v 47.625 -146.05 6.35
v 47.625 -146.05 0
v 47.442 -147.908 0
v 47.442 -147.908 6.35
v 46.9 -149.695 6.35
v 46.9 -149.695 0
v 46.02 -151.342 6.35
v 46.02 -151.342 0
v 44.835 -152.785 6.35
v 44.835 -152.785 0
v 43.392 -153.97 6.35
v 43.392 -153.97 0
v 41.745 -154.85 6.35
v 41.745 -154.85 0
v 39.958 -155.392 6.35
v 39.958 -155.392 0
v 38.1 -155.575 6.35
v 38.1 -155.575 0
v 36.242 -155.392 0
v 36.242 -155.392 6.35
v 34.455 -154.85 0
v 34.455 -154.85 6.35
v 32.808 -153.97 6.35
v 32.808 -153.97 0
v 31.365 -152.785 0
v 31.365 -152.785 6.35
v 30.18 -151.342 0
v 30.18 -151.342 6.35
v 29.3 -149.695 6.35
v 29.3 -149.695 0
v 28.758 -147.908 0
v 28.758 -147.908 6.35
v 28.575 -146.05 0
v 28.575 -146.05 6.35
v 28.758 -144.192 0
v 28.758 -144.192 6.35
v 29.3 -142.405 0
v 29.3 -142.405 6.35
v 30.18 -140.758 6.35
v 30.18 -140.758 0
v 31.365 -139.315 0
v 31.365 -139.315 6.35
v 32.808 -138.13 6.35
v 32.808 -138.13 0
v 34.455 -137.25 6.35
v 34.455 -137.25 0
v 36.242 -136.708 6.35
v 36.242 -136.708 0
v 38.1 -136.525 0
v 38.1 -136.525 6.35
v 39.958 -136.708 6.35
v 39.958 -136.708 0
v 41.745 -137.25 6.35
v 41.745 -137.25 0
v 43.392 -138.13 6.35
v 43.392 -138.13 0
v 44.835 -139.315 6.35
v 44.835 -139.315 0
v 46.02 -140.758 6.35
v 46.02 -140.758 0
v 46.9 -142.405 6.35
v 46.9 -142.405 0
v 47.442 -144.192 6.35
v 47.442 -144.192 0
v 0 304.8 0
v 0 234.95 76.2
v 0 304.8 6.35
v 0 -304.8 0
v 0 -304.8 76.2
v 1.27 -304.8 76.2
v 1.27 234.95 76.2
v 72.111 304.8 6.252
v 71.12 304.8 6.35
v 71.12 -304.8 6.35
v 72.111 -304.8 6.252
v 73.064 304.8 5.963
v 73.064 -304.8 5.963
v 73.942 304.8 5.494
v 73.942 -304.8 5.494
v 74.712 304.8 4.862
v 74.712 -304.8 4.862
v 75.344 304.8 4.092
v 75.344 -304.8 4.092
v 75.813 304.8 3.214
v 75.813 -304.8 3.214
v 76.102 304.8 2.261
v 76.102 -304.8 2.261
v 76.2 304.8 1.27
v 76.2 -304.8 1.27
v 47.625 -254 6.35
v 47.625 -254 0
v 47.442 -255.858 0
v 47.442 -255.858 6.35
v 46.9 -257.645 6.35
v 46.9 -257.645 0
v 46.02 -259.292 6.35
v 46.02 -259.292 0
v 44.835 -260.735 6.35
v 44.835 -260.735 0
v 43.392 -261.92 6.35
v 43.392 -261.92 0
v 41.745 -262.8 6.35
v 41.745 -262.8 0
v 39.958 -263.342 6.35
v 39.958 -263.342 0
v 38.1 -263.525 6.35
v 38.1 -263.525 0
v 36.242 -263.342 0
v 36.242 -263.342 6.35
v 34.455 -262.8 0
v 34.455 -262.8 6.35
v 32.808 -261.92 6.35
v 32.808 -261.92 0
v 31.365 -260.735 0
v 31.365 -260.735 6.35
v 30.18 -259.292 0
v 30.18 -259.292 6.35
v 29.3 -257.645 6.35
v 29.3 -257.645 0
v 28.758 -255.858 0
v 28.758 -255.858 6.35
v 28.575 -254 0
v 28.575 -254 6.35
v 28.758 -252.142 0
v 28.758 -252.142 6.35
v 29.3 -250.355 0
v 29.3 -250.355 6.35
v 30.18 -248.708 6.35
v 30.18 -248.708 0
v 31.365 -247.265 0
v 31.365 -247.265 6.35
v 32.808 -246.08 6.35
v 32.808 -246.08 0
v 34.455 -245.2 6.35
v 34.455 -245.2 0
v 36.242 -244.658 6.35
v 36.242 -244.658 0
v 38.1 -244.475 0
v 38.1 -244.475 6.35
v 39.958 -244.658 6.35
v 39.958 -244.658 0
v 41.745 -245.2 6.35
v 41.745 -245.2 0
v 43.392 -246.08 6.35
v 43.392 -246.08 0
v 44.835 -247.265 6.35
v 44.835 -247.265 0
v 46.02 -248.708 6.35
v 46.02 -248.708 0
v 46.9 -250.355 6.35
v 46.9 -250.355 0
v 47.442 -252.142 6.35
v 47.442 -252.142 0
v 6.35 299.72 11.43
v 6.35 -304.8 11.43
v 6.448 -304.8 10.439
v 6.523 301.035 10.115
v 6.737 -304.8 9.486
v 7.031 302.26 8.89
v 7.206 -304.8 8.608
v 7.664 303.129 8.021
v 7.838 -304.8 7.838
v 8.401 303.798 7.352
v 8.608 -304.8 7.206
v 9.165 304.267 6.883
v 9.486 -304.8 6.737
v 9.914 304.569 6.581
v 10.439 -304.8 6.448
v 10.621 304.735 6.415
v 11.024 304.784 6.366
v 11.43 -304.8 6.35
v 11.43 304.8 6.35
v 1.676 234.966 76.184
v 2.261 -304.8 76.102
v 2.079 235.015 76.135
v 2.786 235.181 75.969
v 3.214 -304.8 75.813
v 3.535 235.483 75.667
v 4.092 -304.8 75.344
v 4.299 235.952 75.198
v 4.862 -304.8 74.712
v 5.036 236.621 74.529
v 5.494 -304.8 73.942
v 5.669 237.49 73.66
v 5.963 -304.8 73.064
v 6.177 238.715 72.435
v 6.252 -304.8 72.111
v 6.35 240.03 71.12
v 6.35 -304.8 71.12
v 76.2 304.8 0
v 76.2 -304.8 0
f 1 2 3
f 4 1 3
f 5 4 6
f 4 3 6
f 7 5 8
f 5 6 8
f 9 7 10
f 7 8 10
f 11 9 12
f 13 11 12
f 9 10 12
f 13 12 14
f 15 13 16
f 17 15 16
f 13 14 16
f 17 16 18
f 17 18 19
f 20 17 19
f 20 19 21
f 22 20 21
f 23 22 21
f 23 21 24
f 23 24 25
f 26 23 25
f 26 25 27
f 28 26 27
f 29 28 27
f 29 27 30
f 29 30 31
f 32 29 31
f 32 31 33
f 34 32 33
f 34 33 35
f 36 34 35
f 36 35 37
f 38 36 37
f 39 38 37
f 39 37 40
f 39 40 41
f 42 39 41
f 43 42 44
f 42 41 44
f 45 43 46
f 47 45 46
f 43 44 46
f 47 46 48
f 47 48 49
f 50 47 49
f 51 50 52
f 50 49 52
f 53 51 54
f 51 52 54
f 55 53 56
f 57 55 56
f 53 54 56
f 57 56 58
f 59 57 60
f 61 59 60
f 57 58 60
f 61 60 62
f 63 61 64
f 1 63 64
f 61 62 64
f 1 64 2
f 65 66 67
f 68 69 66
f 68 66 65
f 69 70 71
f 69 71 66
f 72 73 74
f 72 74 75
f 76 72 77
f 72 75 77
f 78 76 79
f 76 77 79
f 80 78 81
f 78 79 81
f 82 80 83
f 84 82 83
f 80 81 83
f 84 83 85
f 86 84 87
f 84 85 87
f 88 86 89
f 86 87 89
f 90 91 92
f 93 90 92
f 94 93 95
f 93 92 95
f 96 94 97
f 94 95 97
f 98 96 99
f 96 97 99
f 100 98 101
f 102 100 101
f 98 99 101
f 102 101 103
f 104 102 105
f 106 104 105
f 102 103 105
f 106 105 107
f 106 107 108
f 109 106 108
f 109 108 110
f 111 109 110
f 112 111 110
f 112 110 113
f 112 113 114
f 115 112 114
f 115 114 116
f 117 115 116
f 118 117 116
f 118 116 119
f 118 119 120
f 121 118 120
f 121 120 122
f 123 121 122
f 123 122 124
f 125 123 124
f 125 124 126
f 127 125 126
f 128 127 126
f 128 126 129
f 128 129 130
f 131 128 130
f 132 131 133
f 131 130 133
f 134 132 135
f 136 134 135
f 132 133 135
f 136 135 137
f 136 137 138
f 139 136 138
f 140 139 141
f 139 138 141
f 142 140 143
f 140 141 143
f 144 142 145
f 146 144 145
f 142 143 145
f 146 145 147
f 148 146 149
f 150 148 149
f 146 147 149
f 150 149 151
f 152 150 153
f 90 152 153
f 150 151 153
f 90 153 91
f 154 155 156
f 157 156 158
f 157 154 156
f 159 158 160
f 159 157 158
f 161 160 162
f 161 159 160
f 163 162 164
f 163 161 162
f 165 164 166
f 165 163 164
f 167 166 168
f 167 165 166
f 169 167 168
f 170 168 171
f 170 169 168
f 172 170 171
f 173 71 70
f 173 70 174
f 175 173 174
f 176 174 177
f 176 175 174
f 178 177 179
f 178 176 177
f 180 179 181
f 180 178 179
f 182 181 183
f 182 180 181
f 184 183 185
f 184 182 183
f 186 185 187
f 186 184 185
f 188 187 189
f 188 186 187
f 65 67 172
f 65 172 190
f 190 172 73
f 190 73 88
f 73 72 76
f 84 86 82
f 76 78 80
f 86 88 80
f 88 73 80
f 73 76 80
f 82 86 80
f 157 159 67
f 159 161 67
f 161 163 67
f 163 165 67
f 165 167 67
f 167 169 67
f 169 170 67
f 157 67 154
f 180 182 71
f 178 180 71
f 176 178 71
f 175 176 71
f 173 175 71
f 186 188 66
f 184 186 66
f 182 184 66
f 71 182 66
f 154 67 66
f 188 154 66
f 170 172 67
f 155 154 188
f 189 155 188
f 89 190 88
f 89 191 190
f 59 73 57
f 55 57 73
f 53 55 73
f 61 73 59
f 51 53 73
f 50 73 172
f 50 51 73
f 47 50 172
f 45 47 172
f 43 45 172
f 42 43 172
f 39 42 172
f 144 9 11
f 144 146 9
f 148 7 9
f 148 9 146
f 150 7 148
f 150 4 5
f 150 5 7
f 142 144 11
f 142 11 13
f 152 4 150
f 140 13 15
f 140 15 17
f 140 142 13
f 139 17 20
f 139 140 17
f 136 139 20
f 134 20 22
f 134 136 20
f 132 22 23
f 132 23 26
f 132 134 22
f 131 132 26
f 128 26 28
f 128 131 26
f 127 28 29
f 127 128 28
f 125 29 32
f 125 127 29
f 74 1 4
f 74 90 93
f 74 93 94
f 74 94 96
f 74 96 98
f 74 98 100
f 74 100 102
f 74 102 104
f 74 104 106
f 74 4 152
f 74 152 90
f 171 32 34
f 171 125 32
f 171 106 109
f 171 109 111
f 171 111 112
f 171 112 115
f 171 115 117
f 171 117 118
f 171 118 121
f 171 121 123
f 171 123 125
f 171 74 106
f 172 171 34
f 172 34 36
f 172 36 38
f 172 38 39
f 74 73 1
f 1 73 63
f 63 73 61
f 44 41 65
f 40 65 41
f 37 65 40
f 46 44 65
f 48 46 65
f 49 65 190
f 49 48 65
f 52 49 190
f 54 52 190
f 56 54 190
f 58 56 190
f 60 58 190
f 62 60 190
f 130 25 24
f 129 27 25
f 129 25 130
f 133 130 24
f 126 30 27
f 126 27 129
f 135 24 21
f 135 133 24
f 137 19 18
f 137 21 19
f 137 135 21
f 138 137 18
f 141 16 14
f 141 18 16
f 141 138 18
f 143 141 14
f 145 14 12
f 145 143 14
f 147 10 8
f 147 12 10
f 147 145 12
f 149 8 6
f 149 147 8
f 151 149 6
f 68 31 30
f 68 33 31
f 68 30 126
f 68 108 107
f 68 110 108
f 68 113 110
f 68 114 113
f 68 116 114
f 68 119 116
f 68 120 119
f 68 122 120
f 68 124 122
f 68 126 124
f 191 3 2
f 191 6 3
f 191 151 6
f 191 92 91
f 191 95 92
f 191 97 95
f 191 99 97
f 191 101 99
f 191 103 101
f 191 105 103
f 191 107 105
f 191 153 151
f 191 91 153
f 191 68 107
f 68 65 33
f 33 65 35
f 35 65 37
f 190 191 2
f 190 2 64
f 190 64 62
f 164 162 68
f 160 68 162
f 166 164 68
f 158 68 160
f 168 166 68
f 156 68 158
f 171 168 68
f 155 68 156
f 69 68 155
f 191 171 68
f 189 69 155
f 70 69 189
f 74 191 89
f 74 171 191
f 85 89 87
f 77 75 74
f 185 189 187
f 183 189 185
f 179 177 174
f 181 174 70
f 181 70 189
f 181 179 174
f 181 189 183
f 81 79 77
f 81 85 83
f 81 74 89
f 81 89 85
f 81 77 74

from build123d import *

# Parameters (mm, degrees)
F1_DEPTH = 304.8
F2_R     = 5.08
F4_DEPTH = 25.4
F5_R     = 9.525
F6_DEPTH = 25.4


with BuildPart() as f1:
    # F0 (on Front) → F1 (new body, symmetric)
    with BuildSketch(Plane.XZ):
        Polygon((0, 76.2), (0, 0), (76.2, 0), (76.2, 6.35), (6.35, 6.35), (6.35, 76.2), align=None)
    extrude(amount=F1_DEPTH, both=True)

    # F2
    f2_edges = [f1.edges().sort_by_distance(p)[0] for p in [
        (6.35, 0, 76.2),
        (6.35, 0, 6.35),
        (76.2, 0, 6.35),
    ]]
    fillet(f2_edges, radius=F2_R)

    # F3 (on face) → F4 (cut)
    with BuildSketch(Plane(origin=(0, 0, 0), x_dir=(0, -1, 0), z_dir=(-1, 0, 0))):
        Polygon((-304.8, 116.164517), (-304.8, 6.35), (-194.985483, 116.164517), align=None)
    extrude(amount=-F4_DEPTH, mode=Mode.SUBTRACT)

    # F5 (on face) → F6 (cut)
    with BuildSketch(Plane(origin=(0, 0, 0), x_dir=(1, 0, 0), z_dir=(0, 0, -1))):
        with Locations((38.1, 254)):
            Circle(F5_R)
        with Locations((38.1, 146.05)):
            Circle(F5_R)
    extrude(amount=-F6_DEPTH, mode=Mode.SUBTRACT)


solid = f1.part
